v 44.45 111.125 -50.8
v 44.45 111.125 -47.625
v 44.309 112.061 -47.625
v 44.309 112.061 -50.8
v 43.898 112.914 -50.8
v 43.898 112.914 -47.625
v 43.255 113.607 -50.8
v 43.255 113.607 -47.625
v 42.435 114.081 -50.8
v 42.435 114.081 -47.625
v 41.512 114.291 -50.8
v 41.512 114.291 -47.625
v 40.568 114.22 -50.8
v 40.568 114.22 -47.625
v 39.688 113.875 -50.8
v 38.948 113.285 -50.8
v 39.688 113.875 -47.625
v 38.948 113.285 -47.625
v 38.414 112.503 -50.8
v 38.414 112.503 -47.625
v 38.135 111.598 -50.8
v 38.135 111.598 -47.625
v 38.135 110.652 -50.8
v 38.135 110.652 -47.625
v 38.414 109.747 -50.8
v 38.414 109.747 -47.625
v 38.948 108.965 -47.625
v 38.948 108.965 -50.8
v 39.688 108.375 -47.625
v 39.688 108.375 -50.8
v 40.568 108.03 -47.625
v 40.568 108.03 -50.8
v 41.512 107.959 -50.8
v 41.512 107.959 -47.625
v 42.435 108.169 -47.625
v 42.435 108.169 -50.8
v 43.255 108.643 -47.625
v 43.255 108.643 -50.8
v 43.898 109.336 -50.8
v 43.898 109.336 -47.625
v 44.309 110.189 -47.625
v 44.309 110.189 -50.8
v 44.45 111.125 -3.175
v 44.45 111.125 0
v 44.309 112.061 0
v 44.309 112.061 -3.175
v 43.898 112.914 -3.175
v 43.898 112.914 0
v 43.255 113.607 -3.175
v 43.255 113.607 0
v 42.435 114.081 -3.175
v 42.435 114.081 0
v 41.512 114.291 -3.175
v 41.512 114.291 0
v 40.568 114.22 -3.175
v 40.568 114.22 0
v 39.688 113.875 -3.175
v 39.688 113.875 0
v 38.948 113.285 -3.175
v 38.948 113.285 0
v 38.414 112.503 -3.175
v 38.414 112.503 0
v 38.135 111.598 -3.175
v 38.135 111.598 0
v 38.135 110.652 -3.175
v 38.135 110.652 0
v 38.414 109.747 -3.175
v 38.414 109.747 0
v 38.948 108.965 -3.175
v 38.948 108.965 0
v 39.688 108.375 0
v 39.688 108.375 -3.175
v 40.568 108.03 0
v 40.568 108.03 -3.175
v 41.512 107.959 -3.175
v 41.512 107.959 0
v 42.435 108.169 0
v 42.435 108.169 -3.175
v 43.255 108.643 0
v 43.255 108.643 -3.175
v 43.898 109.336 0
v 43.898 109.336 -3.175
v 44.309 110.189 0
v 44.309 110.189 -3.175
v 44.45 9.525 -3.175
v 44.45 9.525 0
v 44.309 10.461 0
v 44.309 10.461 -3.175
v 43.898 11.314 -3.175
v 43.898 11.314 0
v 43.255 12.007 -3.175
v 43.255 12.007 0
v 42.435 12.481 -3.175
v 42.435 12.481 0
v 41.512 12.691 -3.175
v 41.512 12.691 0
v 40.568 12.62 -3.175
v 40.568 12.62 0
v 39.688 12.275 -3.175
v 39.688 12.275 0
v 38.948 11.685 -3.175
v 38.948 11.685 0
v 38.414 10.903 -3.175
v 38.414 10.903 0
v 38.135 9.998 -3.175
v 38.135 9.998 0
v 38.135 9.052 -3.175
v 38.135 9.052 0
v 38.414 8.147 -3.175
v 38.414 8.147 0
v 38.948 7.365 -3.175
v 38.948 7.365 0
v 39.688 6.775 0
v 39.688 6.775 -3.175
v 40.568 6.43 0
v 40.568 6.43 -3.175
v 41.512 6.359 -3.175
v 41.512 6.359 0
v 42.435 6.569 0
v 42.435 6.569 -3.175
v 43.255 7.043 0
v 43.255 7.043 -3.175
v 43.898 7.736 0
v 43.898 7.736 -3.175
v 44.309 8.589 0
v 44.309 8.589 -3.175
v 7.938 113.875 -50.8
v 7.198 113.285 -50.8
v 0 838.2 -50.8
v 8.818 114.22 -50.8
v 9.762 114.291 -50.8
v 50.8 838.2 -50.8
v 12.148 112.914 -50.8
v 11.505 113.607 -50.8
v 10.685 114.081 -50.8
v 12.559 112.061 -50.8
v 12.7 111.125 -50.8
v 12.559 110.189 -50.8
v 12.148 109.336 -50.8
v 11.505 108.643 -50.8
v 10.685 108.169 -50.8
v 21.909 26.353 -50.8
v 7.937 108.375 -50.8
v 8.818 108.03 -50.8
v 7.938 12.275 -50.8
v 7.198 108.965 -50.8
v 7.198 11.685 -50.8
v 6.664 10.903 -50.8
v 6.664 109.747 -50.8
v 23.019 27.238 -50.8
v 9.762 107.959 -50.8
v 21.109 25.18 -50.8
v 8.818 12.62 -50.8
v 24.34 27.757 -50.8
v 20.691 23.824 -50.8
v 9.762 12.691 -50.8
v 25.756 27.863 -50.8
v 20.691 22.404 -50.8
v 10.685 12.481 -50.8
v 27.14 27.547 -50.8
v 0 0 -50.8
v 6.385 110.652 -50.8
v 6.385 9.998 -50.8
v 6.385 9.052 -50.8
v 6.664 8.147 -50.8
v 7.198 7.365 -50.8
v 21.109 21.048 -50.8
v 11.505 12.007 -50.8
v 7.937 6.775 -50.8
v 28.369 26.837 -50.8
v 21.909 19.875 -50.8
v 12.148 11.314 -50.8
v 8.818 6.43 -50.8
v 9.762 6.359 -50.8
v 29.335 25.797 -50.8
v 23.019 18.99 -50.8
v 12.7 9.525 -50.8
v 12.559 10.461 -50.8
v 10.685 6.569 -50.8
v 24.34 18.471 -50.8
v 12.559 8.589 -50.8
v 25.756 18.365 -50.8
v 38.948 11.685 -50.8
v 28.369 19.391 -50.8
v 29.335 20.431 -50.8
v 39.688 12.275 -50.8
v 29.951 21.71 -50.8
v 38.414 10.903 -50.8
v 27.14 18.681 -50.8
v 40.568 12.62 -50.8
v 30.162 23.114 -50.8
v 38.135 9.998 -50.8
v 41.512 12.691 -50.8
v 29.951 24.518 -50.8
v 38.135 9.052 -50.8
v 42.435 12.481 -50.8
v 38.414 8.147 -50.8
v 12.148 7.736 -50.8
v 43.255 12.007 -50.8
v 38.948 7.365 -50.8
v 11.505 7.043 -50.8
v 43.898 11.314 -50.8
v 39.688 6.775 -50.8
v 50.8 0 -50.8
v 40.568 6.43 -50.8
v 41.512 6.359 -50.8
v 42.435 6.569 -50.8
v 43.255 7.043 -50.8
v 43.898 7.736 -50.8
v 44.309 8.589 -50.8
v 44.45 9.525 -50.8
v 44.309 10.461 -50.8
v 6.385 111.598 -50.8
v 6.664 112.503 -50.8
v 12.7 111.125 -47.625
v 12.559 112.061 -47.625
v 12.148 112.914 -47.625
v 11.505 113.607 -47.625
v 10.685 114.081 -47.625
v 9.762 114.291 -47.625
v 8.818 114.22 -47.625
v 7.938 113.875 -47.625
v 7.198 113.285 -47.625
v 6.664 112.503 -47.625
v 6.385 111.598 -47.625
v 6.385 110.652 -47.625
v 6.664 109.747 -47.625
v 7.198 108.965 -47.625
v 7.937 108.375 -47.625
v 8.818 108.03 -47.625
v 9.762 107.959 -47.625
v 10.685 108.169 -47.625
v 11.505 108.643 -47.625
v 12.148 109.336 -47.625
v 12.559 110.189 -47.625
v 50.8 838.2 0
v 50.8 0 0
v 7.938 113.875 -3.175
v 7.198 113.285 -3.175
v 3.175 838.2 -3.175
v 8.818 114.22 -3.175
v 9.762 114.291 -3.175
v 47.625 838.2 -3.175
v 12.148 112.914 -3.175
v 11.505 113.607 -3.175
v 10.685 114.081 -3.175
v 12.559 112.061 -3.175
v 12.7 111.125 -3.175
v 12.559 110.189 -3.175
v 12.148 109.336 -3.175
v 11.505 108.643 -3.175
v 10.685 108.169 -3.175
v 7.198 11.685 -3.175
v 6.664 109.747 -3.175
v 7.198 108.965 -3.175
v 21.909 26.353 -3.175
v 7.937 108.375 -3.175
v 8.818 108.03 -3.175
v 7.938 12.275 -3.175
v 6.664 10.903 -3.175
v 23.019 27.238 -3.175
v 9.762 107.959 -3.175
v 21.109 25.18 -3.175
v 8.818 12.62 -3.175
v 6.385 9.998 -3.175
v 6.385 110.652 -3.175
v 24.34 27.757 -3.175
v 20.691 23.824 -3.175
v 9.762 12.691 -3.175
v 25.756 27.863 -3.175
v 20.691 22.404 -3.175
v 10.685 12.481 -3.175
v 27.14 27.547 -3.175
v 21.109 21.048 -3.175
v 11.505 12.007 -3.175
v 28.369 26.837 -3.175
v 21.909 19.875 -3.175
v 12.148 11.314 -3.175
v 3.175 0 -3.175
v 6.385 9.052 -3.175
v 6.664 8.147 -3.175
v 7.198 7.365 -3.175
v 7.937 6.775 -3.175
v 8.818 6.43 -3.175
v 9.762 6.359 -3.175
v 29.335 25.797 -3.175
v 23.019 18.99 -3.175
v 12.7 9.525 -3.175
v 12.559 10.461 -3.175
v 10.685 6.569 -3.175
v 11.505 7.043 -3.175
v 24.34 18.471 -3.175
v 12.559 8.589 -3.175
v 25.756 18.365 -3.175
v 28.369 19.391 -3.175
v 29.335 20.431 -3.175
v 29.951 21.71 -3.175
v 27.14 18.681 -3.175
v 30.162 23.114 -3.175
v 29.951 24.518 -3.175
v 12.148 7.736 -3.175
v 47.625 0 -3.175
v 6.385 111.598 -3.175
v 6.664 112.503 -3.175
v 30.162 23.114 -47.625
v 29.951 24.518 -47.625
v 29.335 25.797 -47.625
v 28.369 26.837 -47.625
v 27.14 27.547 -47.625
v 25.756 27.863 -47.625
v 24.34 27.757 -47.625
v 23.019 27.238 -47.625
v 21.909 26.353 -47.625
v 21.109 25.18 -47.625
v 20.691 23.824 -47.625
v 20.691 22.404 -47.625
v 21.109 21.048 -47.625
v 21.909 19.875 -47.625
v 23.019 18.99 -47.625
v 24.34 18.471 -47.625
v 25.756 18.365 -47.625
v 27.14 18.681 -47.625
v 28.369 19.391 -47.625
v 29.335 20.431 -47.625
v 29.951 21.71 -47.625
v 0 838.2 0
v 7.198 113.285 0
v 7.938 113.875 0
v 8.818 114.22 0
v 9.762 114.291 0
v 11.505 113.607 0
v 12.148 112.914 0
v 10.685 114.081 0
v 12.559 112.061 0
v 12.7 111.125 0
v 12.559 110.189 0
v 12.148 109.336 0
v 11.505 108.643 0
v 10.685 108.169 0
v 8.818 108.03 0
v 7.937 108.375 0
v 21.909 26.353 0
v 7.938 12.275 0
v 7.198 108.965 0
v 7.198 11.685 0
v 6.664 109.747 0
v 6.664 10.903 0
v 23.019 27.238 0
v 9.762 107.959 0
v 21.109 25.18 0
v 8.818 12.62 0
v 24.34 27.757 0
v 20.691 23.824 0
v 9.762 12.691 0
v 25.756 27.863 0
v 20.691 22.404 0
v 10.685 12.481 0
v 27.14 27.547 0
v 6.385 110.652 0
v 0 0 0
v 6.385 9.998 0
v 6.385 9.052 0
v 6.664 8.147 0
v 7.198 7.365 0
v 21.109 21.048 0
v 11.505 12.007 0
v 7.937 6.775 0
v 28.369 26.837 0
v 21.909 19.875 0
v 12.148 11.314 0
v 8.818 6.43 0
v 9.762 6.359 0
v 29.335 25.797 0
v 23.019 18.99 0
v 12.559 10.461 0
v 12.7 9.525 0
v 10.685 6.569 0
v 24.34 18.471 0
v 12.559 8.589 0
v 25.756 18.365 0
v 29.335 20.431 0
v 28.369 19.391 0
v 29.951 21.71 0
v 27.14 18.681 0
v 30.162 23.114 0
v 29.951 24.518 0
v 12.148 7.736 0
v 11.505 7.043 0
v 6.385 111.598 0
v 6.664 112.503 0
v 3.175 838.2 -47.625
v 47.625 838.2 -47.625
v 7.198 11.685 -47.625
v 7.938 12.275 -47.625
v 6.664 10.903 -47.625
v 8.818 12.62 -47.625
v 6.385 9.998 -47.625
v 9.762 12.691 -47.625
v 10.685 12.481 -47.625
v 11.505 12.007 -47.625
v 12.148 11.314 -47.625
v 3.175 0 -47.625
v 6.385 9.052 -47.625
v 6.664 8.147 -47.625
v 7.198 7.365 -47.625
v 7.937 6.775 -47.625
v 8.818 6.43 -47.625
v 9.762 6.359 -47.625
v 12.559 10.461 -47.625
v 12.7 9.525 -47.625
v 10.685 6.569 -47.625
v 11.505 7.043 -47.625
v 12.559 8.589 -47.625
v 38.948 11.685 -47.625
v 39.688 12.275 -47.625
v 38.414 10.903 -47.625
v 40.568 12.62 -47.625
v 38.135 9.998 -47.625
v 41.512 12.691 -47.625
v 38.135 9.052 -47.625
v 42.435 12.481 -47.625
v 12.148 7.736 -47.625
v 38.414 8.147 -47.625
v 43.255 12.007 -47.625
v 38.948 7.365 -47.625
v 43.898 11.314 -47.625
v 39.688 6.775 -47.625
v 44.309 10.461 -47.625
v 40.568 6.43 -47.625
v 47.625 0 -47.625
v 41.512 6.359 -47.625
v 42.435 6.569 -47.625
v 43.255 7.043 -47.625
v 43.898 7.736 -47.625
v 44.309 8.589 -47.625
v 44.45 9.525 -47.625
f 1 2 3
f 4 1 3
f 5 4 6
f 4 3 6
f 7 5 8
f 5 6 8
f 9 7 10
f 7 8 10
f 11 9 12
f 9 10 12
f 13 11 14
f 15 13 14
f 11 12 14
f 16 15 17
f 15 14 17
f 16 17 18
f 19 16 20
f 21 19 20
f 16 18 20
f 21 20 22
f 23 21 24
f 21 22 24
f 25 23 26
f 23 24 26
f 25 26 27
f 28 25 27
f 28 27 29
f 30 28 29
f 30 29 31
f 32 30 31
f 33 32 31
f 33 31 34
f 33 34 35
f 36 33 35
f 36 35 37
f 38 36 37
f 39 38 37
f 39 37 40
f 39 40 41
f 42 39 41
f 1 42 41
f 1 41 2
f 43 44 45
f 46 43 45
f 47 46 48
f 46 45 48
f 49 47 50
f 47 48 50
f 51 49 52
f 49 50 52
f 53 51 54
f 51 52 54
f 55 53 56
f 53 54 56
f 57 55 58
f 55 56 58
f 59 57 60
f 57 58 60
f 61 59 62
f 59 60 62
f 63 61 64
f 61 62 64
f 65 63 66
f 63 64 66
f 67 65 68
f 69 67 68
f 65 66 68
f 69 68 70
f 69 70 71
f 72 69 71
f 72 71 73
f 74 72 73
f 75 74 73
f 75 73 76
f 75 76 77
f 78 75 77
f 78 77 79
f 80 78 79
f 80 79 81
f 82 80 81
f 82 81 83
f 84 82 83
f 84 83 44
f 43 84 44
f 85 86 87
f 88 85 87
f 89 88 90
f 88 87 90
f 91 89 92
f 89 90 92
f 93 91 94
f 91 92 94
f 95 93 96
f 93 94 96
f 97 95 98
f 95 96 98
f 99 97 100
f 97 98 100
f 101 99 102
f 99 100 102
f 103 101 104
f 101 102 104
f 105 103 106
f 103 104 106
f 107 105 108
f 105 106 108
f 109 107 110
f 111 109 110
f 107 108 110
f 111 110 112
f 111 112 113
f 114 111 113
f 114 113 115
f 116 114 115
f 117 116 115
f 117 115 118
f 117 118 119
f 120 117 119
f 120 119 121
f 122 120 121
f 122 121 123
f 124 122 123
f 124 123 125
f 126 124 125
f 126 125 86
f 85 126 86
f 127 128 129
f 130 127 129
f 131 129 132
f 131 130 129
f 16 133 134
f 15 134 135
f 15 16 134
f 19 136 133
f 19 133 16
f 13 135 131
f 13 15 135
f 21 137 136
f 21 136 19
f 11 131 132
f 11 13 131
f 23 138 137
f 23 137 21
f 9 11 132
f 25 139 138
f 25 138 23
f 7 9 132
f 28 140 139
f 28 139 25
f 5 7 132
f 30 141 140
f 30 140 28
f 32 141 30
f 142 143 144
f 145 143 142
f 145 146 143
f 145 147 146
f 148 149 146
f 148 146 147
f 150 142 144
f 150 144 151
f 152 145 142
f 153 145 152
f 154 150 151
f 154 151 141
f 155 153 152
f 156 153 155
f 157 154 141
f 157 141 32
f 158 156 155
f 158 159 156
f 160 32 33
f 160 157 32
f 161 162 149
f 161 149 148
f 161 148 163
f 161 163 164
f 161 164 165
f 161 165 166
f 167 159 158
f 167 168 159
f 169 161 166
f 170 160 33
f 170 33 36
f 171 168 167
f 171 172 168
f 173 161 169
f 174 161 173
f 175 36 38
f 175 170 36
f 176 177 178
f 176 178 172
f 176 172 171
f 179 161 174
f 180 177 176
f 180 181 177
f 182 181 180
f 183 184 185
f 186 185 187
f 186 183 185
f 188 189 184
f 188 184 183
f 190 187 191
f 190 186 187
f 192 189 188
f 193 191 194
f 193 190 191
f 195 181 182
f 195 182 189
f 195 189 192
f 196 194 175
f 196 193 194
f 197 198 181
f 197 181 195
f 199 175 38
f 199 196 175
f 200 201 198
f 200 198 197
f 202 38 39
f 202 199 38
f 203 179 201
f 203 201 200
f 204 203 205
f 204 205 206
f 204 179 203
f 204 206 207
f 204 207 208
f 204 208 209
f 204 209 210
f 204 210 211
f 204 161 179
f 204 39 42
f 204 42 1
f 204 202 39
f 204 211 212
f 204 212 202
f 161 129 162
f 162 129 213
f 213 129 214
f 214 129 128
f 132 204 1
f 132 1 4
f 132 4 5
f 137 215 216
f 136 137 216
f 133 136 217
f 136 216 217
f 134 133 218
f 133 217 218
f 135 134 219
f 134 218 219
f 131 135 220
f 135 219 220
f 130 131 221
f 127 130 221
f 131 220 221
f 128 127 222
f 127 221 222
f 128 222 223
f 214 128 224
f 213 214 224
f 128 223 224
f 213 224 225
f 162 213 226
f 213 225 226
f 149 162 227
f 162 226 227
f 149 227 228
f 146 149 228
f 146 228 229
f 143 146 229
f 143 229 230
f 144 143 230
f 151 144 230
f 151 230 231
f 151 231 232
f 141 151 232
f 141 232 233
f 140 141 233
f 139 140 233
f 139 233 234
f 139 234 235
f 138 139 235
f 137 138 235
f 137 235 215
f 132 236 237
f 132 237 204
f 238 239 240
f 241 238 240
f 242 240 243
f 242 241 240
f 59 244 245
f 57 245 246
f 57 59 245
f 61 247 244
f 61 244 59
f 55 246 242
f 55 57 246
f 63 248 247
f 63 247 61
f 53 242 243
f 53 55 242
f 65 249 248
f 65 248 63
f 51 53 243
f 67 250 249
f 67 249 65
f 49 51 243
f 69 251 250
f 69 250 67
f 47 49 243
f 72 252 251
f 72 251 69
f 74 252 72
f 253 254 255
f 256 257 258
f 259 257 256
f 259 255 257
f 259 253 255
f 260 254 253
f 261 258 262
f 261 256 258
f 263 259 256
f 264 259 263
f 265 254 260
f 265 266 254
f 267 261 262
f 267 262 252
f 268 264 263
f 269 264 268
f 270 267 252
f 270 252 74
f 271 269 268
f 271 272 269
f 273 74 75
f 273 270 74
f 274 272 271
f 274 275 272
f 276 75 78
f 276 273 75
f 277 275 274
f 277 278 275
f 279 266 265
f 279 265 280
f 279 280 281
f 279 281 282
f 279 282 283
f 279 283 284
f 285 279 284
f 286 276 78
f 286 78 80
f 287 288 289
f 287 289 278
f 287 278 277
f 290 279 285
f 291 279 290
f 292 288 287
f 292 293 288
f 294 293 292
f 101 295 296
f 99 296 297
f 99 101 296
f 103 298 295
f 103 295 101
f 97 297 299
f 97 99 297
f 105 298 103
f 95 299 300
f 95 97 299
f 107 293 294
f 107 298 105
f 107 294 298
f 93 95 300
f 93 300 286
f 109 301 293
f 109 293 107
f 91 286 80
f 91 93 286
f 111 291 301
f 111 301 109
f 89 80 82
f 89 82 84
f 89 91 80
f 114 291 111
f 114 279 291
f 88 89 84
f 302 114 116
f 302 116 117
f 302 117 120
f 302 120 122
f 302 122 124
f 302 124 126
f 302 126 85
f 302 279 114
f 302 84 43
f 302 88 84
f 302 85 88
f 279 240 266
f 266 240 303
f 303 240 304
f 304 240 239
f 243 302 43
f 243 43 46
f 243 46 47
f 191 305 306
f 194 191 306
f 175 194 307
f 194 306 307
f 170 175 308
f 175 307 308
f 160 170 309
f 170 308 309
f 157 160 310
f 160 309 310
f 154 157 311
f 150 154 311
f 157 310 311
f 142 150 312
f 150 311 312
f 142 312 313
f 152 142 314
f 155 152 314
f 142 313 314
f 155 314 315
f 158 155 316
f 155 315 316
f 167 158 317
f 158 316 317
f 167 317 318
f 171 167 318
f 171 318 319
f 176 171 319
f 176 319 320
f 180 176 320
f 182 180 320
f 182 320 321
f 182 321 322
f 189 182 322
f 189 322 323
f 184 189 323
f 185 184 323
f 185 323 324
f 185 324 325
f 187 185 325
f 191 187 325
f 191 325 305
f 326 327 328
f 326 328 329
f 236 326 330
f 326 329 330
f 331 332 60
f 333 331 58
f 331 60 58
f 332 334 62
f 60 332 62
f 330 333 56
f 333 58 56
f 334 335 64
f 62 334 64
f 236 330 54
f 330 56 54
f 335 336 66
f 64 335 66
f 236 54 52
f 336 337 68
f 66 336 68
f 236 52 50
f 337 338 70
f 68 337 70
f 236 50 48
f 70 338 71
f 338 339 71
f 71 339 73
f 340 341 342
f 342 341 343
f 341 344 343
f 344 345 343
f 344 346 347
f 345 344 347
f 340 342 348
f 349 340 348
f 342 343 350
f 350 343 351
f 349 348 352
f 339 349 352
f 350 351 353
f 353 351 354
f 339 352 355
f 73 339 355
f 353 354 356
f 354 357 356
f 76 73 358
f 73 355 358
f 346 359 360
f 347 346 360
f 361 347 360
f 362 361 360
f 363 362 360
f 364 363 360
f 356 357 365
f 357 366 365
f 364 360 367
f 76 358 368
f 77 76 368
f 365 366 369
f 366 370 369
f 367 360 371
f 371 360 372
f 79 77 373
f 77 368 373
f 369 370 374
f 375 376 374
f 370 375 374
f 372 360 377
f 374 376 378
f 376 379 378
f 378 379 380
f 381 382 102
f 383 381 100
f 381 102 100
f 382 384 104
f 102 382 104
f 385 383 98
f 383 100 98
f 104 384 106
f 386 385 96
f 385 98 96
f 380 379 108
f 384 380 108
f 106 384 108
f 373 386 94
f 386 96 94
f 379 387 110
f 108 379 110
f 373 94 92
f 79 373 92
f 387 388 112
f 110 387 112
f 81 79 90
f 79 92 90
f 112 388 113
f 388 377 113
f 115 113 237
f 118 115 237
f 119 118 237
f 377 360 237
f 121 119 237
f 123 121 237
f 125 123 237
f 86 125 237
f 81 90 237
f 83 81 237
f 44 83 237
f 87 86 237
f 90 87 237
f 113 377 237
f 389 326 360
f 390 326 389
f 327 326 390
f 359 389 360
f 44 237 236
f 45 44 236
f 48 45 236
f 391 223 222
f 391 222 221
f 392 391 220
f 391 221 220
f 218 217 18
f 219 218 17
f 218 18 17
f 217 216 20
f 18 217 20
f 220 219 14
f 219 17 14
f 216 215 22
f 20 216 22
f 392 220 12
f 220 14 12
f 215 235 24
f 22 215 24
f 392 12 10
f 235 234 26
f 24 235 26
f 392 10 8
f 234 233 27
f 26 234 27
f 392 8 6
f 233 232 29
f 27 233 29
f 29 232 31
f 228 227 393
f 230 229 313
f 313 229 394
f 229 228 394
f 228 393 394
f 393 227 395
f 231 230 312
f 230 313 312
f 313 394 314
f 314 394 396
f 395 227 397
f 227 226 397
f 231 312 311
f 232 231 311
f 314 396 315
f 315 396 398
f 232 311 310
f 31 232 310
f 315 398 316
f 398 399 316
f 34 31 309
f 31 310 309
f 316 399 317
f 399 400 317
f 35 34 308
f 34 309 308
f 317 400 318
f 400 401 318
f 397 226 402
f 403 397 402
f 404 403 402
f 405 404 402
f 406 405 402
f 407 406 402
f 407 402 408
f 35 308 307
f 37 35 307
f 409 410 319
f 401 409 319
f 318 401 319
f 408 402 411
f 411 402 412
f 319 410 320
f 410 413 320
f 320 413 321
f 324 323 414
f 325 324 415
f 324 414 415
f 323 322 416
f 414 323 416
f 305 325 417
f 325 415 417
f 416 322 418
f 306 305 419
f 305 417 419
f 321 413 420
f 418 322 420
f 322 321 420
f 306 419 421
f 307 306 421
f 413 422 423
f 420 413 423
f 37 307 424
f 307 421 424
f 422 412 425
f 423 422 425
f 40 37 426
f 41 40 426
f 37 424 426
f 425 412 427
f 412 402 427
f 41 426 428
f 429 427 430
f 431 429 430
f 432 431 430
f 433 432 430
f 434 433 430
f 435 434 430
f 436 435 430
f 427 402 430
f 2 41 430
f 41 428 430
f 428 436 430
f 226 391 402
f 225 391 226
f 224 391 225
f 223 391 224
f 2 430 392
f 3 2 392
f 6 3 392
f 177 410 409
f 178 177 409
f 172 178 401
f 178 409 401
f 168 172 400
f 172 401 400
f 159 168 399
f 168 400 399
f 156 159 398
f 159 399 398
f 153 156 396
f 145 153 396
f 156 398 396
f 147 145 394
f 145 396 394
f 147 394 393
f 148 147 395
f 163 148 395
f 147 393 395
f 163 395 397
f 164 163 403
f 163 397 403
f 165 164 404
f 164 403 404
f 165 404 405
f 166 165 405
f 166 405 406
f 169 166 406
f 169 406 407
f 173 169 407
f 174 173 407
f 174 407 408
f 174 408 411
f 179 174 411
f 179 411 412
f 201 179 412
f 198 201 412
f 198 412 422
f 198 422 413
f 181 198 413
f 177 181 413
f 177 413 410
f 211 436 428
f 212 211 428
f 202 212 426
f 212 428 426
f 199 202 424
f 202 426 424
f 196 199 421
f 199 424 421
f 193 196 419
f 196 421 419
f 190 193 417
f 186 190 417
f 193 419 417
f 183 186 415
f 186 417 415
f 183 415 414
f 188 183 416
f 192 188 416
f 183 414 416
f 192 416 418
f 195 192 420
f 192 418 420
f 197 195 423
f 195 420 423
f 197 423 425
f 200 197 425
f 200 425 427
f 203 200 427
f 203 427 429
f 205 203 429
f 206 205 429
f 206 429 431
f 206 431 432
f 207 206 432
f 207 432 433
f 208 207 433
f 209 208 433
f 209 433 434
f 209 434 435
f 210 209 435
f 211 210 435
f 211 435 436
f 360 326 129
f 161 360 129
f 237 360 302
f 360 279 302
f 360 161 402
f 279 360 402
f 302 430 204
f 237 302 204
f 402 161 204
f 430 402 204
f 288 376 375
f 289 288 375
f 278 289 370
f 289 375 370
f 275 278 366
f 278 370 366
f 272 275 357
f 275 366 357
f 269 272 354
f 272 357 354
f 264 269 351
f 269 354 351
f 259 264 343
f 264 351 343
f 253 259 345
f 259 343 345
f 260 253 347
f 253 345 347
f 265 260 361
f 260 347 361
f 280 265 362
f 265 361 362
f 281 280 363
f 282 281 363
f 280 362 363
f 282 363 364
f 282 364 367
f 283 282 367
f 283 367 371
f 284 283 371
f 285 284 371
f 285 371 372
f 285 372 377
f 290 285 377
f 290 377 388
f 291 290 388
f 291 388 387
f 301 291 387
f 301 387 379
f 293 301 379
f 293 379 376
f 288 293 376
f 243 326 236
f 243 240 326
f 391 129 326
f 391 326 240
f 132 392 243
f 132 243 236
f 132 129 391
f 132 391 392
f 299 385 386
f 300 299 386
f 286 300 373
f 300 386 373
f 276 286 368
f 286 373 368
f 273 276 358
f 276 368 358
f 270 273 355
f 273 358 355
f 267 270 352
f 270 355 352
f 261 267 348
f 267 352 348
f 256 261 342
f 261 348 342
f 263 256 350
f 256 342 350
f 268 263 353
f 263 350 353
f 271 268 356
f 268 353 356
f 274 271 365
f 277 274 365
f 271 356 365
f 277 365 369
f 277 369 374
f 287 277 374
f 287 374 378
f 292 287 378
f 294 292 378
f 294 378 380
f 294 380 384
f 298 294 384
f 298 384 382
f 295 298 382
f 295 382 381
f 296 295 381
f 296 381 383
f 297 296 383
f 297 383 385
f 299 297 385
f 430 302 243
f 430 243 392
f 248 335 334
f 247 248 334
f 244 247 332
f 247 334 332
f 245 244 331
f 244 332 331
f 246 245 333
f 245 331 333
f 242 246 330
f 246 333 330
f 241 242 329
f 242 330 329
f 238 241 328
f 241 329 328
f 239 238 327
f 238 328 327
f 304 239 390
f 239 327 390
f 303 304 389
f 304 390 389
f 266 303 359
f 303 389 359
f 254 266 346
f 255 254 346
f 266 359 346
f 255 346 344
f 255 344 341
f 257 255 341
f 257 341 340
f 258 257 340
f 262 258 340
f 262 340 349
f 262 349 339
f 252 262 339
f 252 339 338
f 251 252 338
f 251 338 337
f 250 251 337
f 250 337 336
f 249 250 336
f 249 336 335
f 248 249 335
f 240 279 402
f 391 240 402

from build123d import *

# Parameters (mm, degrees)
SKETCH1_W           = 50.8
SKETCH1_H           = 50.8
SKETCH1_W_2         = 44.45
SKETCH1_H_2         = 44.45
BOSS_EXTRUDE1_DEPTH = 838.2
SKETCH2_R           = 3.175
SKETCH2_R_2         = 4.7625
CUT_EXTRUDE1_DEPTH  = 842.273154213


with BuildPart() as part:
    # Sketch1 → Boss-Extrude1 (new body)
    with BuildSketch(Plane(origin=(0, 0, 0), x_dir=(1, 0, 0), z_dir=(0, 1, 0))):
        with Locations((25.4, 25.4)):
            Rectangle(SKETCH1_W, SKETCH1_H)
        with Locations((25.4, 25.4)):
            Rectangle(SKETCH1_W_2, SKETCH1_H_2, mode=Mode.SUBTRACT)
    extrude(amount=BOSS_EXTRUDE1_DEPTH)

    # Sketch2 → Cut-Extrude1 (cut, through all)
    with BuildSketch(Plane.XY):
        with Locations((9.525, 111.125)):
            Circle(SKETCH2_R)
        with Locations((41.275, 111.125)):
            Circle(SKETCH2_R)
        with Locations((9.525, 9.525)):
            Circle(SKETCH2_R)
        with Locations((41.275, 9.525)):
            Circle(SKETCH2_R)
        with Locations((25.4, 23.114)):
            Circle(SKETCH2_R_2)
    extrude(amount=-CUT_EXTRUDE1_DEPTH, mode=Mode.SUBTRACT)


solid = part.part
